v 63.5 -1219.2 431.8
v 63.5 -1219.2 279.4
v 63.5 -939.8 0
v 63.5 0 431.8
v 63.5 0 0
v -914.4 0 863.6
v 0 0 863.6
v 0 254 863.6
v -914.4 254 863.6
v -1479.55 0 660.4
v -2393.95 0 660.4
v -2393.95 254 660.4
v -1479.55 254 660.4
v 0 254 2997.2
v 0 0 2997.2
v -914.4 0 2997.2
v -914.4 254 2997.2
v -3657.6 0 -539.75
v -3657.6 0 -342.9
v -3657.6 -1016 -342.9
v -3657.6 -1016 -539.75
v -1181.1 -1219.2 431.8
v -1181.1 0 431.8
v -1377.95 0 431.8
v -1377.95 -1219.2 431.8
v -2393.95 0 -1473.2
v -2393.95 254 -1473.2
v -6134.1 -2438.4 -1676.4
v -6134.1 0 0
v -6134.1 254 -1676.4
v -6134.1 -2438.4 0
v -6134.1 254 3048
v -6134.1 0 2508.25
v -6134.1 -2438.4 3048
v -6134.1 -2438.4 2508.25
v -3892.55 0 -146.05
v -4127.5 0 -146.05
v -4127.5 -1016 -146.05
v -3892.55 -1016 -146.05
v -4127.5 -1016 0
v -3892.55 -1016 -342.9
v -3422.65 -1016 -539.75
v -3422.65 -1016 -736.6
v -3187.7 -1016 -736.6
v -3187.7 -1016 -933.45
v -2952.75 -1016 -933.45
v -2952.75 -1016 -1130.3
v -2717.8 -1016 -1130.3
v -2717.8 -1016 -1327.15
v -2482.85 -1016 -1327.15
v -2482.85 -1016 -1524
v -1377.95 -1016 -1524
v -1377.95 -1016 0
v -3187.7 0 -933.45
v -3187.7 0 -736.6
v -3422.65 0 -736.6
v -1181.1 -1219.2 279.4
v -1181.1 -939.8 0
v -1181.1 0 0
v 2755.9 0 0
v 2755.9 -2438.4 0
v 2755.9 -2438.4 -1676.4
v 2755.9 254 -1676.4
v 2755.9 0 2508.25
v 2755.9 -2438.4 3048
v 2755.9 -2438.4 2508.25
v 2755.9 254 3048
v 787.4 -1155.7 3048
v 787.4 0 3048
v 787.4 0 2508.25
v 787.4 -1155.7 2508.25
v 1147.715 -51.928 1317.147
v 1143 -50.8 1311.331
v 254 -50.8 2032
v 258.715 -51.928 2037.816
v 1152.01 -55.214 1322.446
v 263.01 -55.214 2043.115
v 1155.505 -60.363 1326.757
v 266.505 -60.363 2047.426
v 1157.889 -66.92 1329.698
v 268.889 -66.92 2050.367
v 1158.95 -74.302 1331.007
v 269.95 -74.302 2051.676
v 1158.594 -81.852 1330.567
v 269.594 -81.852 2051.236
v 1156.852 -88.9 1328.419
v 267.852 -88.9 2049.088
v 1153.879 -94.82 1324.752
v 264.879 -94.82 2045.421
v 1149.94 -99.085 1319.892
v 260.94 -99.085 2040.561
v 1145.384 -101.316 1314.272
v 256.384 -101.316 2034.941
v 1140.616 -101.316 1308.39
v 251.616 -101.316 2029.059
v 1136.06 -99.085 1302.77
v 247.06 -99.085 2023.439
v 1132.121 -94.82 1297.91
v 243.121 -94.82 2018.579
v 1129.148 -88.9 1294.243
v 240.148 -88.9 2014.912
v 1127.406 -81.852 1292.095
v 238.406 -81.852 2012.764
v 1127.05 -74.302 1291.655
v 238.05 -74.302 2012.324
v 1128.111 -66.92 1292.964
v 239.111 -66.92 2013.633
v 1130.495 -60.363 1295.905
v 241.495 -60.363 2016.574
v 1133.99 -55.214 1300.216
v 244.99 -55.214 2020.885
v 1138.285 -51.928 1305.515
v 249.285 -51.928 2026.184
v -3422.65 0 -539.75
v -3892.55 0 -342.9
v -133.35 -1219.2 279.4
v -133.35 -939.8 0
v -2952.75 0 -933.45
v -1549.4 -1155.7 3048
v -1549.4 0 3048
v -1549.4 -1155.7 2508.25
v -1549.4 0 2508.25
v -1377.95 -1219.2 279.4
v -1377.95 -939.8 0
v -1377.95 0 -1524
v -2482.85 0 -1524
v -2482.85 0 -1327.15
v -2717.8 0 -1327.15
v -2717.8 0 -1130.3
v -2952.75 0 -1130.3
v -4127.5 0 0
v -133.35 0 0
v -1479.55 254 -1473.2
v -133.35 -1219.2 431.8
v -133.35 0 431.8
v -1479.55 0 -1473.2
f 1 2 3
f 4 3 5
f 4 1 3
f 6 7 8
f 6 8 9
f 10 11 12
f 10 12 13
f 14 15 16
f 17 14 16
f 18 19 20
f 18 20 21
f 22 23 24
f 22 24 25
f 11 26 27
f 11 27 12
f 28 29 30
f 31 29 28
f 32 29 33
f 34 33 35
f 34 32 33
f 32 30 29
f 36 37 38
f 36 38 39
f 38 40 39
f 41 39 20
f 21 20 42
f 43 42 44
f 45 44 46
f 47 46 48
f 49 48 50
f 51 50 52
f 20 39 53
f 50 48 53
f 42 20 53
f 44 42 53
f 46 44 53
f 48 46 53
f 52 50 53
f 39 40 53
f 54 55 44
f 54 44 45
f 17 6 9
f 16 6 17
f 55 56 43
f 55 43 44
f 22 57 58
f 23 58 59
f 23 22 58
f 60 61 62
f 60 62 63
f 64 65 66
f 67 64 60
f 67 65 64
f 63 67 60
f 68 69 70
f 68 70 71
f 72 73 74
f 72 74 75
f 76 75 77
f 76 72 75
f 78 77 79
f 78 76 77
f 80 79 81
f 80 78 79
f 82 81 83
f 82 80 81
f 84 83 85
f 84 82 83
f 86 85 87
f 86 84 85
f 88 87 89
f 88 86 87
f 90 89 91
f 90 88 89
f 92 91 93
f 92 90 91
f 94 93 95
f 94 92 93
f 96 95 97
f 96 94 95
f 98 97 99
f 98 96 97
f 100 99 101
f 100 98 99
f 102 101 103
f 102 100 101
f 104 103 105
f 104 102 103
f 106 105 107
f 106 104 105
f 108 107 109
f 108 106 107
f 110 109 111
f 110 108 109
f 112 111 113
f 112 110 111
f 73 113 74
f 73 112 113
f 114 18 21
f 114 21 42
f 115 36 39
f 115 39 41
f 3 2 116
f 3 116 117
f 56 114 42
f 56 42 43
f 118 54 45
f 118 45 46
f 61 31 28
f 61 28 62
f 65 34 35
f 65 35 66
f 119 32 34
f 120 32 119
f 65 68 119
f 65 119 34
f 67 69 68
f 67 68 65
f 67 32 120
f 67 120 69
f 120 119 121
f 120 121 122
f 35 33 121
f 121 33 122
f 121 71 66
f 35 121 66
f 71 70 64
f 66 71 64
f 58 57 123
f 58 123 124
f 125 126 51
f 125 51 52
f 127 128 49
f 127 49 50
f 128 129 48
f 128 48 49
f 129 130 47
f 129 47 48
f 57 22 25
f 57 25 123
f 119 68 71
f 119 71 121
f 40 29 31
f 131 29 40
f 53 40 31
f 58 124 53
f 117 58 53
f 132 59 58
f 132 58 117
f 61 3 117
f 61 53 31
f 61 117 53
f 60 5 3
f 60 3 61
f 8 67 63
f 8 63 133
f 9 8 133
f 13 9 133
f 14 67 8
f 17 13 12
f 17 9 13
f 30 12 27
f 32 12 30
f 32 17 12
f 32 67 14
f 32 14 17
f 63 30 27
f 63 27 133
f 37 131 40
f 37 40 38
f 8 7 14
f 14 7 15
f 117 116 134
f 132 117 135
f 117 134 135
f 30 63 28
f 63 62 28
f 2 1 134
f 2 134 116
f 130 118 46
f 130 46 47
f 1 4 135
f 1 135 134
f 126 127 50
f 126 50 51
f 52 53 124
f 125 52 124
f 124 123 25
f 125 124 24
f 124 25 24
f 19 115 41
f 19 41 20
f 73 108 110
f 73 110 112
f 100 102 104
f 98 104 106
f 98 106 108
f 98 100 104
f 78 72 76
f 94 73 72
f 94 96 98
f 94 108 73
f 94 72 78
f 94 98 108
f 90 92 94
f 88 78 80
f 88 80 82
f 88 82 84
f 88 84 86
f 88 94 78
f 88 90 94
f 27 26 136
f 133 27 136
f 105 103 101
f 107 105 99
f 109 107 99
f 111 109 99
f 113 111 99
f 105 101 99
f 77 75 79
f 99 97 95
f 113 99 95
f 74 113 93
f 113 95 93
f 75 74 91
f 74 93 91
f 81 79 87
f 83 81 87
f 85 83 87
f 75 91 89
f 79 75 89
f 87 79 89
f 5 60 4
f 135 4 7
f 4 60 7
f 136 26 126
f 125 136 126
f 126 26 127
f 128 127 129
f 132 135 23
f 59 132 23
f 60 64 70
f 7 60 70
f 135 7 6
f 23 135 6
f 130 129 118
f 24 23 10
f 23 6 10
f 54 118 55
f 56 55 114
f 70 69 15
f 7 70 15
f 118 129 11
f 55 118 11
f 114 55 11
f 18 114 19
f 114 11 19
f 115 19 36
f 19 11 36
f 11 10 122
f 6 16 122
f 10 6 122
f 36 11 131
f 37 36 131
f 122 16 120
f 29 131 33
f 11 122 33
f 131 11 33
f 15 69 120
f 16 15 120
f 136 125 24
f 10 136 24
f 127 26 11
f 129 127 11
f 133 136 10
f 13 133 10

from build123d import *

# Parameters (mm, degrees)
F0_W      = 8890
F0_H      = 2438.4
F1_DEPTH  = 1676.4
F2_W      = 914.4
F2_H      = 2133.6
F3_DEPTH  = 254
F7_DEPTH  = 1441.45
F8_W      = 1047.75
F8_H      = 1219.2
F9_DEPTH  = 431.8
F11_DEPTH = 1016
F13_DEPTH = 539.75
F17_R     = 25.4
F19_W     = 914.4
F19_H     = 2133.6
F20_DEPTH = 254


with BuildPart() as f1:
    # F0 (on Top) → F1 (new body)
    with BuildSketch(Plane.XY):
        with Locations((-1689.1, -1219.2)):
            Rectangle(F0_W, F0_H)
    extrude(amount=-F1_DEPTH)

    # F2 (on face) → F3 (join)
    with BuildSketch(Plane(origin=(0, 0, 0), x_dir=(-1, 0, 0), z_dir=(0, 1, 0))):
        Polygon((6134.1, 0), (6134.1, 3048), (-2755.9, 3048), (-2755.9, 0), (-2755.9, -1676.4), (6134.1, -1676.4), align=None)
        with Locations((457.2, 1930.4)):
            Rectangle(F2_W, F2_H, mode=Mode.SUBTRACT)
    extrude(amount=F3_DEPTH)

    # F6 (on offset) → F7 (join, through all)
    with BuildSketch(Plane.YZ.offset(63.5)):
        Polygon((-939.8, 0), (0, 0), (0, 431.8), (-1219.2, 431.8), (-1219.2, 279.4), align=None)
    extrude(amount=-F7_DEPTH)

    # F8 (on face) → F9 (cut, through all)
    with BuildSketch(Plane.XY.offset(431.8)):
        with Locations((-657.225, -609.6)):
            Rectangle(F8_W, F8_H)
    extrude(amount=-F9_DEPTH, mode=Mode.SUBTRACT)

    # F10 (on face) → F11 (cut)
    with BuildSketch(Plane.XZ):
        Polygon((-1377.95, -1524), (-1377.95, 0), (-4127.5, 0), (-4127.5, -146.05), (-3892.55, -146.05), (-3892.55, -342.9), (-3657.6, -342.9), (-3657.6, -539.75), (-3422.65, -539.75), (-3422.65, -736.6), (-3187.7, -736.6), (-3187.7, -933.45), (-2952.75, -933.45), (-2952.75, -1130.3), (-2717.8, -1130.3), (-2717.8, -1327.15), (-2482.85, -1327.15), (-2482.85, -1524), align=None)
    extrude(amount=F11_DEPTH, mode=Mode.SUBTRACT)

    # F12 (on face) → F13 (join)
    with BuildSketch(Plane.XY.offset(3048)):
        Polygon((-1549.4, 0), (-6134.1, 0), (-6134.1, -2438.4), (2755.9, -2438.4), (2755.9, 0), (787.4, 0), (787.4, -1155.7), (-1549.4, -1155.7), align=None)
    extrude(amount=-F13_DEPTH)

    # F19 (on face) → F20 (cut, through all)
    with BuildSketch(Plane.XZ):
        with Locations((-1936.75, -406.4)):
            Rectangle(F19_W, F19_H)
    extrude(amount=-F20_DEPTH, mode=Mode.SUBTRACT)


with BuildPart() as f18:
    # F18: sweep along a path in F15
    with BuildLine(Plane.XZ.offset(76.2)) as f18_path:
        Line((254, 2032), (1143, 1311.3309500408))
    # F17 (on line) → F18 (sweep)
    with BuildSketch(Plane(origin=(48.2560568288, 0, -39.1188376035), x_dir=(0, 1, 0), z_dir=(0.7768163436, 0, -0.6297272174))):
        with Locations((-76.2, 1738.441523336)):
            Circle(F17_R)
    sweep(path=f18_path.line)


solid = Compound([f1.part, f18.part])
